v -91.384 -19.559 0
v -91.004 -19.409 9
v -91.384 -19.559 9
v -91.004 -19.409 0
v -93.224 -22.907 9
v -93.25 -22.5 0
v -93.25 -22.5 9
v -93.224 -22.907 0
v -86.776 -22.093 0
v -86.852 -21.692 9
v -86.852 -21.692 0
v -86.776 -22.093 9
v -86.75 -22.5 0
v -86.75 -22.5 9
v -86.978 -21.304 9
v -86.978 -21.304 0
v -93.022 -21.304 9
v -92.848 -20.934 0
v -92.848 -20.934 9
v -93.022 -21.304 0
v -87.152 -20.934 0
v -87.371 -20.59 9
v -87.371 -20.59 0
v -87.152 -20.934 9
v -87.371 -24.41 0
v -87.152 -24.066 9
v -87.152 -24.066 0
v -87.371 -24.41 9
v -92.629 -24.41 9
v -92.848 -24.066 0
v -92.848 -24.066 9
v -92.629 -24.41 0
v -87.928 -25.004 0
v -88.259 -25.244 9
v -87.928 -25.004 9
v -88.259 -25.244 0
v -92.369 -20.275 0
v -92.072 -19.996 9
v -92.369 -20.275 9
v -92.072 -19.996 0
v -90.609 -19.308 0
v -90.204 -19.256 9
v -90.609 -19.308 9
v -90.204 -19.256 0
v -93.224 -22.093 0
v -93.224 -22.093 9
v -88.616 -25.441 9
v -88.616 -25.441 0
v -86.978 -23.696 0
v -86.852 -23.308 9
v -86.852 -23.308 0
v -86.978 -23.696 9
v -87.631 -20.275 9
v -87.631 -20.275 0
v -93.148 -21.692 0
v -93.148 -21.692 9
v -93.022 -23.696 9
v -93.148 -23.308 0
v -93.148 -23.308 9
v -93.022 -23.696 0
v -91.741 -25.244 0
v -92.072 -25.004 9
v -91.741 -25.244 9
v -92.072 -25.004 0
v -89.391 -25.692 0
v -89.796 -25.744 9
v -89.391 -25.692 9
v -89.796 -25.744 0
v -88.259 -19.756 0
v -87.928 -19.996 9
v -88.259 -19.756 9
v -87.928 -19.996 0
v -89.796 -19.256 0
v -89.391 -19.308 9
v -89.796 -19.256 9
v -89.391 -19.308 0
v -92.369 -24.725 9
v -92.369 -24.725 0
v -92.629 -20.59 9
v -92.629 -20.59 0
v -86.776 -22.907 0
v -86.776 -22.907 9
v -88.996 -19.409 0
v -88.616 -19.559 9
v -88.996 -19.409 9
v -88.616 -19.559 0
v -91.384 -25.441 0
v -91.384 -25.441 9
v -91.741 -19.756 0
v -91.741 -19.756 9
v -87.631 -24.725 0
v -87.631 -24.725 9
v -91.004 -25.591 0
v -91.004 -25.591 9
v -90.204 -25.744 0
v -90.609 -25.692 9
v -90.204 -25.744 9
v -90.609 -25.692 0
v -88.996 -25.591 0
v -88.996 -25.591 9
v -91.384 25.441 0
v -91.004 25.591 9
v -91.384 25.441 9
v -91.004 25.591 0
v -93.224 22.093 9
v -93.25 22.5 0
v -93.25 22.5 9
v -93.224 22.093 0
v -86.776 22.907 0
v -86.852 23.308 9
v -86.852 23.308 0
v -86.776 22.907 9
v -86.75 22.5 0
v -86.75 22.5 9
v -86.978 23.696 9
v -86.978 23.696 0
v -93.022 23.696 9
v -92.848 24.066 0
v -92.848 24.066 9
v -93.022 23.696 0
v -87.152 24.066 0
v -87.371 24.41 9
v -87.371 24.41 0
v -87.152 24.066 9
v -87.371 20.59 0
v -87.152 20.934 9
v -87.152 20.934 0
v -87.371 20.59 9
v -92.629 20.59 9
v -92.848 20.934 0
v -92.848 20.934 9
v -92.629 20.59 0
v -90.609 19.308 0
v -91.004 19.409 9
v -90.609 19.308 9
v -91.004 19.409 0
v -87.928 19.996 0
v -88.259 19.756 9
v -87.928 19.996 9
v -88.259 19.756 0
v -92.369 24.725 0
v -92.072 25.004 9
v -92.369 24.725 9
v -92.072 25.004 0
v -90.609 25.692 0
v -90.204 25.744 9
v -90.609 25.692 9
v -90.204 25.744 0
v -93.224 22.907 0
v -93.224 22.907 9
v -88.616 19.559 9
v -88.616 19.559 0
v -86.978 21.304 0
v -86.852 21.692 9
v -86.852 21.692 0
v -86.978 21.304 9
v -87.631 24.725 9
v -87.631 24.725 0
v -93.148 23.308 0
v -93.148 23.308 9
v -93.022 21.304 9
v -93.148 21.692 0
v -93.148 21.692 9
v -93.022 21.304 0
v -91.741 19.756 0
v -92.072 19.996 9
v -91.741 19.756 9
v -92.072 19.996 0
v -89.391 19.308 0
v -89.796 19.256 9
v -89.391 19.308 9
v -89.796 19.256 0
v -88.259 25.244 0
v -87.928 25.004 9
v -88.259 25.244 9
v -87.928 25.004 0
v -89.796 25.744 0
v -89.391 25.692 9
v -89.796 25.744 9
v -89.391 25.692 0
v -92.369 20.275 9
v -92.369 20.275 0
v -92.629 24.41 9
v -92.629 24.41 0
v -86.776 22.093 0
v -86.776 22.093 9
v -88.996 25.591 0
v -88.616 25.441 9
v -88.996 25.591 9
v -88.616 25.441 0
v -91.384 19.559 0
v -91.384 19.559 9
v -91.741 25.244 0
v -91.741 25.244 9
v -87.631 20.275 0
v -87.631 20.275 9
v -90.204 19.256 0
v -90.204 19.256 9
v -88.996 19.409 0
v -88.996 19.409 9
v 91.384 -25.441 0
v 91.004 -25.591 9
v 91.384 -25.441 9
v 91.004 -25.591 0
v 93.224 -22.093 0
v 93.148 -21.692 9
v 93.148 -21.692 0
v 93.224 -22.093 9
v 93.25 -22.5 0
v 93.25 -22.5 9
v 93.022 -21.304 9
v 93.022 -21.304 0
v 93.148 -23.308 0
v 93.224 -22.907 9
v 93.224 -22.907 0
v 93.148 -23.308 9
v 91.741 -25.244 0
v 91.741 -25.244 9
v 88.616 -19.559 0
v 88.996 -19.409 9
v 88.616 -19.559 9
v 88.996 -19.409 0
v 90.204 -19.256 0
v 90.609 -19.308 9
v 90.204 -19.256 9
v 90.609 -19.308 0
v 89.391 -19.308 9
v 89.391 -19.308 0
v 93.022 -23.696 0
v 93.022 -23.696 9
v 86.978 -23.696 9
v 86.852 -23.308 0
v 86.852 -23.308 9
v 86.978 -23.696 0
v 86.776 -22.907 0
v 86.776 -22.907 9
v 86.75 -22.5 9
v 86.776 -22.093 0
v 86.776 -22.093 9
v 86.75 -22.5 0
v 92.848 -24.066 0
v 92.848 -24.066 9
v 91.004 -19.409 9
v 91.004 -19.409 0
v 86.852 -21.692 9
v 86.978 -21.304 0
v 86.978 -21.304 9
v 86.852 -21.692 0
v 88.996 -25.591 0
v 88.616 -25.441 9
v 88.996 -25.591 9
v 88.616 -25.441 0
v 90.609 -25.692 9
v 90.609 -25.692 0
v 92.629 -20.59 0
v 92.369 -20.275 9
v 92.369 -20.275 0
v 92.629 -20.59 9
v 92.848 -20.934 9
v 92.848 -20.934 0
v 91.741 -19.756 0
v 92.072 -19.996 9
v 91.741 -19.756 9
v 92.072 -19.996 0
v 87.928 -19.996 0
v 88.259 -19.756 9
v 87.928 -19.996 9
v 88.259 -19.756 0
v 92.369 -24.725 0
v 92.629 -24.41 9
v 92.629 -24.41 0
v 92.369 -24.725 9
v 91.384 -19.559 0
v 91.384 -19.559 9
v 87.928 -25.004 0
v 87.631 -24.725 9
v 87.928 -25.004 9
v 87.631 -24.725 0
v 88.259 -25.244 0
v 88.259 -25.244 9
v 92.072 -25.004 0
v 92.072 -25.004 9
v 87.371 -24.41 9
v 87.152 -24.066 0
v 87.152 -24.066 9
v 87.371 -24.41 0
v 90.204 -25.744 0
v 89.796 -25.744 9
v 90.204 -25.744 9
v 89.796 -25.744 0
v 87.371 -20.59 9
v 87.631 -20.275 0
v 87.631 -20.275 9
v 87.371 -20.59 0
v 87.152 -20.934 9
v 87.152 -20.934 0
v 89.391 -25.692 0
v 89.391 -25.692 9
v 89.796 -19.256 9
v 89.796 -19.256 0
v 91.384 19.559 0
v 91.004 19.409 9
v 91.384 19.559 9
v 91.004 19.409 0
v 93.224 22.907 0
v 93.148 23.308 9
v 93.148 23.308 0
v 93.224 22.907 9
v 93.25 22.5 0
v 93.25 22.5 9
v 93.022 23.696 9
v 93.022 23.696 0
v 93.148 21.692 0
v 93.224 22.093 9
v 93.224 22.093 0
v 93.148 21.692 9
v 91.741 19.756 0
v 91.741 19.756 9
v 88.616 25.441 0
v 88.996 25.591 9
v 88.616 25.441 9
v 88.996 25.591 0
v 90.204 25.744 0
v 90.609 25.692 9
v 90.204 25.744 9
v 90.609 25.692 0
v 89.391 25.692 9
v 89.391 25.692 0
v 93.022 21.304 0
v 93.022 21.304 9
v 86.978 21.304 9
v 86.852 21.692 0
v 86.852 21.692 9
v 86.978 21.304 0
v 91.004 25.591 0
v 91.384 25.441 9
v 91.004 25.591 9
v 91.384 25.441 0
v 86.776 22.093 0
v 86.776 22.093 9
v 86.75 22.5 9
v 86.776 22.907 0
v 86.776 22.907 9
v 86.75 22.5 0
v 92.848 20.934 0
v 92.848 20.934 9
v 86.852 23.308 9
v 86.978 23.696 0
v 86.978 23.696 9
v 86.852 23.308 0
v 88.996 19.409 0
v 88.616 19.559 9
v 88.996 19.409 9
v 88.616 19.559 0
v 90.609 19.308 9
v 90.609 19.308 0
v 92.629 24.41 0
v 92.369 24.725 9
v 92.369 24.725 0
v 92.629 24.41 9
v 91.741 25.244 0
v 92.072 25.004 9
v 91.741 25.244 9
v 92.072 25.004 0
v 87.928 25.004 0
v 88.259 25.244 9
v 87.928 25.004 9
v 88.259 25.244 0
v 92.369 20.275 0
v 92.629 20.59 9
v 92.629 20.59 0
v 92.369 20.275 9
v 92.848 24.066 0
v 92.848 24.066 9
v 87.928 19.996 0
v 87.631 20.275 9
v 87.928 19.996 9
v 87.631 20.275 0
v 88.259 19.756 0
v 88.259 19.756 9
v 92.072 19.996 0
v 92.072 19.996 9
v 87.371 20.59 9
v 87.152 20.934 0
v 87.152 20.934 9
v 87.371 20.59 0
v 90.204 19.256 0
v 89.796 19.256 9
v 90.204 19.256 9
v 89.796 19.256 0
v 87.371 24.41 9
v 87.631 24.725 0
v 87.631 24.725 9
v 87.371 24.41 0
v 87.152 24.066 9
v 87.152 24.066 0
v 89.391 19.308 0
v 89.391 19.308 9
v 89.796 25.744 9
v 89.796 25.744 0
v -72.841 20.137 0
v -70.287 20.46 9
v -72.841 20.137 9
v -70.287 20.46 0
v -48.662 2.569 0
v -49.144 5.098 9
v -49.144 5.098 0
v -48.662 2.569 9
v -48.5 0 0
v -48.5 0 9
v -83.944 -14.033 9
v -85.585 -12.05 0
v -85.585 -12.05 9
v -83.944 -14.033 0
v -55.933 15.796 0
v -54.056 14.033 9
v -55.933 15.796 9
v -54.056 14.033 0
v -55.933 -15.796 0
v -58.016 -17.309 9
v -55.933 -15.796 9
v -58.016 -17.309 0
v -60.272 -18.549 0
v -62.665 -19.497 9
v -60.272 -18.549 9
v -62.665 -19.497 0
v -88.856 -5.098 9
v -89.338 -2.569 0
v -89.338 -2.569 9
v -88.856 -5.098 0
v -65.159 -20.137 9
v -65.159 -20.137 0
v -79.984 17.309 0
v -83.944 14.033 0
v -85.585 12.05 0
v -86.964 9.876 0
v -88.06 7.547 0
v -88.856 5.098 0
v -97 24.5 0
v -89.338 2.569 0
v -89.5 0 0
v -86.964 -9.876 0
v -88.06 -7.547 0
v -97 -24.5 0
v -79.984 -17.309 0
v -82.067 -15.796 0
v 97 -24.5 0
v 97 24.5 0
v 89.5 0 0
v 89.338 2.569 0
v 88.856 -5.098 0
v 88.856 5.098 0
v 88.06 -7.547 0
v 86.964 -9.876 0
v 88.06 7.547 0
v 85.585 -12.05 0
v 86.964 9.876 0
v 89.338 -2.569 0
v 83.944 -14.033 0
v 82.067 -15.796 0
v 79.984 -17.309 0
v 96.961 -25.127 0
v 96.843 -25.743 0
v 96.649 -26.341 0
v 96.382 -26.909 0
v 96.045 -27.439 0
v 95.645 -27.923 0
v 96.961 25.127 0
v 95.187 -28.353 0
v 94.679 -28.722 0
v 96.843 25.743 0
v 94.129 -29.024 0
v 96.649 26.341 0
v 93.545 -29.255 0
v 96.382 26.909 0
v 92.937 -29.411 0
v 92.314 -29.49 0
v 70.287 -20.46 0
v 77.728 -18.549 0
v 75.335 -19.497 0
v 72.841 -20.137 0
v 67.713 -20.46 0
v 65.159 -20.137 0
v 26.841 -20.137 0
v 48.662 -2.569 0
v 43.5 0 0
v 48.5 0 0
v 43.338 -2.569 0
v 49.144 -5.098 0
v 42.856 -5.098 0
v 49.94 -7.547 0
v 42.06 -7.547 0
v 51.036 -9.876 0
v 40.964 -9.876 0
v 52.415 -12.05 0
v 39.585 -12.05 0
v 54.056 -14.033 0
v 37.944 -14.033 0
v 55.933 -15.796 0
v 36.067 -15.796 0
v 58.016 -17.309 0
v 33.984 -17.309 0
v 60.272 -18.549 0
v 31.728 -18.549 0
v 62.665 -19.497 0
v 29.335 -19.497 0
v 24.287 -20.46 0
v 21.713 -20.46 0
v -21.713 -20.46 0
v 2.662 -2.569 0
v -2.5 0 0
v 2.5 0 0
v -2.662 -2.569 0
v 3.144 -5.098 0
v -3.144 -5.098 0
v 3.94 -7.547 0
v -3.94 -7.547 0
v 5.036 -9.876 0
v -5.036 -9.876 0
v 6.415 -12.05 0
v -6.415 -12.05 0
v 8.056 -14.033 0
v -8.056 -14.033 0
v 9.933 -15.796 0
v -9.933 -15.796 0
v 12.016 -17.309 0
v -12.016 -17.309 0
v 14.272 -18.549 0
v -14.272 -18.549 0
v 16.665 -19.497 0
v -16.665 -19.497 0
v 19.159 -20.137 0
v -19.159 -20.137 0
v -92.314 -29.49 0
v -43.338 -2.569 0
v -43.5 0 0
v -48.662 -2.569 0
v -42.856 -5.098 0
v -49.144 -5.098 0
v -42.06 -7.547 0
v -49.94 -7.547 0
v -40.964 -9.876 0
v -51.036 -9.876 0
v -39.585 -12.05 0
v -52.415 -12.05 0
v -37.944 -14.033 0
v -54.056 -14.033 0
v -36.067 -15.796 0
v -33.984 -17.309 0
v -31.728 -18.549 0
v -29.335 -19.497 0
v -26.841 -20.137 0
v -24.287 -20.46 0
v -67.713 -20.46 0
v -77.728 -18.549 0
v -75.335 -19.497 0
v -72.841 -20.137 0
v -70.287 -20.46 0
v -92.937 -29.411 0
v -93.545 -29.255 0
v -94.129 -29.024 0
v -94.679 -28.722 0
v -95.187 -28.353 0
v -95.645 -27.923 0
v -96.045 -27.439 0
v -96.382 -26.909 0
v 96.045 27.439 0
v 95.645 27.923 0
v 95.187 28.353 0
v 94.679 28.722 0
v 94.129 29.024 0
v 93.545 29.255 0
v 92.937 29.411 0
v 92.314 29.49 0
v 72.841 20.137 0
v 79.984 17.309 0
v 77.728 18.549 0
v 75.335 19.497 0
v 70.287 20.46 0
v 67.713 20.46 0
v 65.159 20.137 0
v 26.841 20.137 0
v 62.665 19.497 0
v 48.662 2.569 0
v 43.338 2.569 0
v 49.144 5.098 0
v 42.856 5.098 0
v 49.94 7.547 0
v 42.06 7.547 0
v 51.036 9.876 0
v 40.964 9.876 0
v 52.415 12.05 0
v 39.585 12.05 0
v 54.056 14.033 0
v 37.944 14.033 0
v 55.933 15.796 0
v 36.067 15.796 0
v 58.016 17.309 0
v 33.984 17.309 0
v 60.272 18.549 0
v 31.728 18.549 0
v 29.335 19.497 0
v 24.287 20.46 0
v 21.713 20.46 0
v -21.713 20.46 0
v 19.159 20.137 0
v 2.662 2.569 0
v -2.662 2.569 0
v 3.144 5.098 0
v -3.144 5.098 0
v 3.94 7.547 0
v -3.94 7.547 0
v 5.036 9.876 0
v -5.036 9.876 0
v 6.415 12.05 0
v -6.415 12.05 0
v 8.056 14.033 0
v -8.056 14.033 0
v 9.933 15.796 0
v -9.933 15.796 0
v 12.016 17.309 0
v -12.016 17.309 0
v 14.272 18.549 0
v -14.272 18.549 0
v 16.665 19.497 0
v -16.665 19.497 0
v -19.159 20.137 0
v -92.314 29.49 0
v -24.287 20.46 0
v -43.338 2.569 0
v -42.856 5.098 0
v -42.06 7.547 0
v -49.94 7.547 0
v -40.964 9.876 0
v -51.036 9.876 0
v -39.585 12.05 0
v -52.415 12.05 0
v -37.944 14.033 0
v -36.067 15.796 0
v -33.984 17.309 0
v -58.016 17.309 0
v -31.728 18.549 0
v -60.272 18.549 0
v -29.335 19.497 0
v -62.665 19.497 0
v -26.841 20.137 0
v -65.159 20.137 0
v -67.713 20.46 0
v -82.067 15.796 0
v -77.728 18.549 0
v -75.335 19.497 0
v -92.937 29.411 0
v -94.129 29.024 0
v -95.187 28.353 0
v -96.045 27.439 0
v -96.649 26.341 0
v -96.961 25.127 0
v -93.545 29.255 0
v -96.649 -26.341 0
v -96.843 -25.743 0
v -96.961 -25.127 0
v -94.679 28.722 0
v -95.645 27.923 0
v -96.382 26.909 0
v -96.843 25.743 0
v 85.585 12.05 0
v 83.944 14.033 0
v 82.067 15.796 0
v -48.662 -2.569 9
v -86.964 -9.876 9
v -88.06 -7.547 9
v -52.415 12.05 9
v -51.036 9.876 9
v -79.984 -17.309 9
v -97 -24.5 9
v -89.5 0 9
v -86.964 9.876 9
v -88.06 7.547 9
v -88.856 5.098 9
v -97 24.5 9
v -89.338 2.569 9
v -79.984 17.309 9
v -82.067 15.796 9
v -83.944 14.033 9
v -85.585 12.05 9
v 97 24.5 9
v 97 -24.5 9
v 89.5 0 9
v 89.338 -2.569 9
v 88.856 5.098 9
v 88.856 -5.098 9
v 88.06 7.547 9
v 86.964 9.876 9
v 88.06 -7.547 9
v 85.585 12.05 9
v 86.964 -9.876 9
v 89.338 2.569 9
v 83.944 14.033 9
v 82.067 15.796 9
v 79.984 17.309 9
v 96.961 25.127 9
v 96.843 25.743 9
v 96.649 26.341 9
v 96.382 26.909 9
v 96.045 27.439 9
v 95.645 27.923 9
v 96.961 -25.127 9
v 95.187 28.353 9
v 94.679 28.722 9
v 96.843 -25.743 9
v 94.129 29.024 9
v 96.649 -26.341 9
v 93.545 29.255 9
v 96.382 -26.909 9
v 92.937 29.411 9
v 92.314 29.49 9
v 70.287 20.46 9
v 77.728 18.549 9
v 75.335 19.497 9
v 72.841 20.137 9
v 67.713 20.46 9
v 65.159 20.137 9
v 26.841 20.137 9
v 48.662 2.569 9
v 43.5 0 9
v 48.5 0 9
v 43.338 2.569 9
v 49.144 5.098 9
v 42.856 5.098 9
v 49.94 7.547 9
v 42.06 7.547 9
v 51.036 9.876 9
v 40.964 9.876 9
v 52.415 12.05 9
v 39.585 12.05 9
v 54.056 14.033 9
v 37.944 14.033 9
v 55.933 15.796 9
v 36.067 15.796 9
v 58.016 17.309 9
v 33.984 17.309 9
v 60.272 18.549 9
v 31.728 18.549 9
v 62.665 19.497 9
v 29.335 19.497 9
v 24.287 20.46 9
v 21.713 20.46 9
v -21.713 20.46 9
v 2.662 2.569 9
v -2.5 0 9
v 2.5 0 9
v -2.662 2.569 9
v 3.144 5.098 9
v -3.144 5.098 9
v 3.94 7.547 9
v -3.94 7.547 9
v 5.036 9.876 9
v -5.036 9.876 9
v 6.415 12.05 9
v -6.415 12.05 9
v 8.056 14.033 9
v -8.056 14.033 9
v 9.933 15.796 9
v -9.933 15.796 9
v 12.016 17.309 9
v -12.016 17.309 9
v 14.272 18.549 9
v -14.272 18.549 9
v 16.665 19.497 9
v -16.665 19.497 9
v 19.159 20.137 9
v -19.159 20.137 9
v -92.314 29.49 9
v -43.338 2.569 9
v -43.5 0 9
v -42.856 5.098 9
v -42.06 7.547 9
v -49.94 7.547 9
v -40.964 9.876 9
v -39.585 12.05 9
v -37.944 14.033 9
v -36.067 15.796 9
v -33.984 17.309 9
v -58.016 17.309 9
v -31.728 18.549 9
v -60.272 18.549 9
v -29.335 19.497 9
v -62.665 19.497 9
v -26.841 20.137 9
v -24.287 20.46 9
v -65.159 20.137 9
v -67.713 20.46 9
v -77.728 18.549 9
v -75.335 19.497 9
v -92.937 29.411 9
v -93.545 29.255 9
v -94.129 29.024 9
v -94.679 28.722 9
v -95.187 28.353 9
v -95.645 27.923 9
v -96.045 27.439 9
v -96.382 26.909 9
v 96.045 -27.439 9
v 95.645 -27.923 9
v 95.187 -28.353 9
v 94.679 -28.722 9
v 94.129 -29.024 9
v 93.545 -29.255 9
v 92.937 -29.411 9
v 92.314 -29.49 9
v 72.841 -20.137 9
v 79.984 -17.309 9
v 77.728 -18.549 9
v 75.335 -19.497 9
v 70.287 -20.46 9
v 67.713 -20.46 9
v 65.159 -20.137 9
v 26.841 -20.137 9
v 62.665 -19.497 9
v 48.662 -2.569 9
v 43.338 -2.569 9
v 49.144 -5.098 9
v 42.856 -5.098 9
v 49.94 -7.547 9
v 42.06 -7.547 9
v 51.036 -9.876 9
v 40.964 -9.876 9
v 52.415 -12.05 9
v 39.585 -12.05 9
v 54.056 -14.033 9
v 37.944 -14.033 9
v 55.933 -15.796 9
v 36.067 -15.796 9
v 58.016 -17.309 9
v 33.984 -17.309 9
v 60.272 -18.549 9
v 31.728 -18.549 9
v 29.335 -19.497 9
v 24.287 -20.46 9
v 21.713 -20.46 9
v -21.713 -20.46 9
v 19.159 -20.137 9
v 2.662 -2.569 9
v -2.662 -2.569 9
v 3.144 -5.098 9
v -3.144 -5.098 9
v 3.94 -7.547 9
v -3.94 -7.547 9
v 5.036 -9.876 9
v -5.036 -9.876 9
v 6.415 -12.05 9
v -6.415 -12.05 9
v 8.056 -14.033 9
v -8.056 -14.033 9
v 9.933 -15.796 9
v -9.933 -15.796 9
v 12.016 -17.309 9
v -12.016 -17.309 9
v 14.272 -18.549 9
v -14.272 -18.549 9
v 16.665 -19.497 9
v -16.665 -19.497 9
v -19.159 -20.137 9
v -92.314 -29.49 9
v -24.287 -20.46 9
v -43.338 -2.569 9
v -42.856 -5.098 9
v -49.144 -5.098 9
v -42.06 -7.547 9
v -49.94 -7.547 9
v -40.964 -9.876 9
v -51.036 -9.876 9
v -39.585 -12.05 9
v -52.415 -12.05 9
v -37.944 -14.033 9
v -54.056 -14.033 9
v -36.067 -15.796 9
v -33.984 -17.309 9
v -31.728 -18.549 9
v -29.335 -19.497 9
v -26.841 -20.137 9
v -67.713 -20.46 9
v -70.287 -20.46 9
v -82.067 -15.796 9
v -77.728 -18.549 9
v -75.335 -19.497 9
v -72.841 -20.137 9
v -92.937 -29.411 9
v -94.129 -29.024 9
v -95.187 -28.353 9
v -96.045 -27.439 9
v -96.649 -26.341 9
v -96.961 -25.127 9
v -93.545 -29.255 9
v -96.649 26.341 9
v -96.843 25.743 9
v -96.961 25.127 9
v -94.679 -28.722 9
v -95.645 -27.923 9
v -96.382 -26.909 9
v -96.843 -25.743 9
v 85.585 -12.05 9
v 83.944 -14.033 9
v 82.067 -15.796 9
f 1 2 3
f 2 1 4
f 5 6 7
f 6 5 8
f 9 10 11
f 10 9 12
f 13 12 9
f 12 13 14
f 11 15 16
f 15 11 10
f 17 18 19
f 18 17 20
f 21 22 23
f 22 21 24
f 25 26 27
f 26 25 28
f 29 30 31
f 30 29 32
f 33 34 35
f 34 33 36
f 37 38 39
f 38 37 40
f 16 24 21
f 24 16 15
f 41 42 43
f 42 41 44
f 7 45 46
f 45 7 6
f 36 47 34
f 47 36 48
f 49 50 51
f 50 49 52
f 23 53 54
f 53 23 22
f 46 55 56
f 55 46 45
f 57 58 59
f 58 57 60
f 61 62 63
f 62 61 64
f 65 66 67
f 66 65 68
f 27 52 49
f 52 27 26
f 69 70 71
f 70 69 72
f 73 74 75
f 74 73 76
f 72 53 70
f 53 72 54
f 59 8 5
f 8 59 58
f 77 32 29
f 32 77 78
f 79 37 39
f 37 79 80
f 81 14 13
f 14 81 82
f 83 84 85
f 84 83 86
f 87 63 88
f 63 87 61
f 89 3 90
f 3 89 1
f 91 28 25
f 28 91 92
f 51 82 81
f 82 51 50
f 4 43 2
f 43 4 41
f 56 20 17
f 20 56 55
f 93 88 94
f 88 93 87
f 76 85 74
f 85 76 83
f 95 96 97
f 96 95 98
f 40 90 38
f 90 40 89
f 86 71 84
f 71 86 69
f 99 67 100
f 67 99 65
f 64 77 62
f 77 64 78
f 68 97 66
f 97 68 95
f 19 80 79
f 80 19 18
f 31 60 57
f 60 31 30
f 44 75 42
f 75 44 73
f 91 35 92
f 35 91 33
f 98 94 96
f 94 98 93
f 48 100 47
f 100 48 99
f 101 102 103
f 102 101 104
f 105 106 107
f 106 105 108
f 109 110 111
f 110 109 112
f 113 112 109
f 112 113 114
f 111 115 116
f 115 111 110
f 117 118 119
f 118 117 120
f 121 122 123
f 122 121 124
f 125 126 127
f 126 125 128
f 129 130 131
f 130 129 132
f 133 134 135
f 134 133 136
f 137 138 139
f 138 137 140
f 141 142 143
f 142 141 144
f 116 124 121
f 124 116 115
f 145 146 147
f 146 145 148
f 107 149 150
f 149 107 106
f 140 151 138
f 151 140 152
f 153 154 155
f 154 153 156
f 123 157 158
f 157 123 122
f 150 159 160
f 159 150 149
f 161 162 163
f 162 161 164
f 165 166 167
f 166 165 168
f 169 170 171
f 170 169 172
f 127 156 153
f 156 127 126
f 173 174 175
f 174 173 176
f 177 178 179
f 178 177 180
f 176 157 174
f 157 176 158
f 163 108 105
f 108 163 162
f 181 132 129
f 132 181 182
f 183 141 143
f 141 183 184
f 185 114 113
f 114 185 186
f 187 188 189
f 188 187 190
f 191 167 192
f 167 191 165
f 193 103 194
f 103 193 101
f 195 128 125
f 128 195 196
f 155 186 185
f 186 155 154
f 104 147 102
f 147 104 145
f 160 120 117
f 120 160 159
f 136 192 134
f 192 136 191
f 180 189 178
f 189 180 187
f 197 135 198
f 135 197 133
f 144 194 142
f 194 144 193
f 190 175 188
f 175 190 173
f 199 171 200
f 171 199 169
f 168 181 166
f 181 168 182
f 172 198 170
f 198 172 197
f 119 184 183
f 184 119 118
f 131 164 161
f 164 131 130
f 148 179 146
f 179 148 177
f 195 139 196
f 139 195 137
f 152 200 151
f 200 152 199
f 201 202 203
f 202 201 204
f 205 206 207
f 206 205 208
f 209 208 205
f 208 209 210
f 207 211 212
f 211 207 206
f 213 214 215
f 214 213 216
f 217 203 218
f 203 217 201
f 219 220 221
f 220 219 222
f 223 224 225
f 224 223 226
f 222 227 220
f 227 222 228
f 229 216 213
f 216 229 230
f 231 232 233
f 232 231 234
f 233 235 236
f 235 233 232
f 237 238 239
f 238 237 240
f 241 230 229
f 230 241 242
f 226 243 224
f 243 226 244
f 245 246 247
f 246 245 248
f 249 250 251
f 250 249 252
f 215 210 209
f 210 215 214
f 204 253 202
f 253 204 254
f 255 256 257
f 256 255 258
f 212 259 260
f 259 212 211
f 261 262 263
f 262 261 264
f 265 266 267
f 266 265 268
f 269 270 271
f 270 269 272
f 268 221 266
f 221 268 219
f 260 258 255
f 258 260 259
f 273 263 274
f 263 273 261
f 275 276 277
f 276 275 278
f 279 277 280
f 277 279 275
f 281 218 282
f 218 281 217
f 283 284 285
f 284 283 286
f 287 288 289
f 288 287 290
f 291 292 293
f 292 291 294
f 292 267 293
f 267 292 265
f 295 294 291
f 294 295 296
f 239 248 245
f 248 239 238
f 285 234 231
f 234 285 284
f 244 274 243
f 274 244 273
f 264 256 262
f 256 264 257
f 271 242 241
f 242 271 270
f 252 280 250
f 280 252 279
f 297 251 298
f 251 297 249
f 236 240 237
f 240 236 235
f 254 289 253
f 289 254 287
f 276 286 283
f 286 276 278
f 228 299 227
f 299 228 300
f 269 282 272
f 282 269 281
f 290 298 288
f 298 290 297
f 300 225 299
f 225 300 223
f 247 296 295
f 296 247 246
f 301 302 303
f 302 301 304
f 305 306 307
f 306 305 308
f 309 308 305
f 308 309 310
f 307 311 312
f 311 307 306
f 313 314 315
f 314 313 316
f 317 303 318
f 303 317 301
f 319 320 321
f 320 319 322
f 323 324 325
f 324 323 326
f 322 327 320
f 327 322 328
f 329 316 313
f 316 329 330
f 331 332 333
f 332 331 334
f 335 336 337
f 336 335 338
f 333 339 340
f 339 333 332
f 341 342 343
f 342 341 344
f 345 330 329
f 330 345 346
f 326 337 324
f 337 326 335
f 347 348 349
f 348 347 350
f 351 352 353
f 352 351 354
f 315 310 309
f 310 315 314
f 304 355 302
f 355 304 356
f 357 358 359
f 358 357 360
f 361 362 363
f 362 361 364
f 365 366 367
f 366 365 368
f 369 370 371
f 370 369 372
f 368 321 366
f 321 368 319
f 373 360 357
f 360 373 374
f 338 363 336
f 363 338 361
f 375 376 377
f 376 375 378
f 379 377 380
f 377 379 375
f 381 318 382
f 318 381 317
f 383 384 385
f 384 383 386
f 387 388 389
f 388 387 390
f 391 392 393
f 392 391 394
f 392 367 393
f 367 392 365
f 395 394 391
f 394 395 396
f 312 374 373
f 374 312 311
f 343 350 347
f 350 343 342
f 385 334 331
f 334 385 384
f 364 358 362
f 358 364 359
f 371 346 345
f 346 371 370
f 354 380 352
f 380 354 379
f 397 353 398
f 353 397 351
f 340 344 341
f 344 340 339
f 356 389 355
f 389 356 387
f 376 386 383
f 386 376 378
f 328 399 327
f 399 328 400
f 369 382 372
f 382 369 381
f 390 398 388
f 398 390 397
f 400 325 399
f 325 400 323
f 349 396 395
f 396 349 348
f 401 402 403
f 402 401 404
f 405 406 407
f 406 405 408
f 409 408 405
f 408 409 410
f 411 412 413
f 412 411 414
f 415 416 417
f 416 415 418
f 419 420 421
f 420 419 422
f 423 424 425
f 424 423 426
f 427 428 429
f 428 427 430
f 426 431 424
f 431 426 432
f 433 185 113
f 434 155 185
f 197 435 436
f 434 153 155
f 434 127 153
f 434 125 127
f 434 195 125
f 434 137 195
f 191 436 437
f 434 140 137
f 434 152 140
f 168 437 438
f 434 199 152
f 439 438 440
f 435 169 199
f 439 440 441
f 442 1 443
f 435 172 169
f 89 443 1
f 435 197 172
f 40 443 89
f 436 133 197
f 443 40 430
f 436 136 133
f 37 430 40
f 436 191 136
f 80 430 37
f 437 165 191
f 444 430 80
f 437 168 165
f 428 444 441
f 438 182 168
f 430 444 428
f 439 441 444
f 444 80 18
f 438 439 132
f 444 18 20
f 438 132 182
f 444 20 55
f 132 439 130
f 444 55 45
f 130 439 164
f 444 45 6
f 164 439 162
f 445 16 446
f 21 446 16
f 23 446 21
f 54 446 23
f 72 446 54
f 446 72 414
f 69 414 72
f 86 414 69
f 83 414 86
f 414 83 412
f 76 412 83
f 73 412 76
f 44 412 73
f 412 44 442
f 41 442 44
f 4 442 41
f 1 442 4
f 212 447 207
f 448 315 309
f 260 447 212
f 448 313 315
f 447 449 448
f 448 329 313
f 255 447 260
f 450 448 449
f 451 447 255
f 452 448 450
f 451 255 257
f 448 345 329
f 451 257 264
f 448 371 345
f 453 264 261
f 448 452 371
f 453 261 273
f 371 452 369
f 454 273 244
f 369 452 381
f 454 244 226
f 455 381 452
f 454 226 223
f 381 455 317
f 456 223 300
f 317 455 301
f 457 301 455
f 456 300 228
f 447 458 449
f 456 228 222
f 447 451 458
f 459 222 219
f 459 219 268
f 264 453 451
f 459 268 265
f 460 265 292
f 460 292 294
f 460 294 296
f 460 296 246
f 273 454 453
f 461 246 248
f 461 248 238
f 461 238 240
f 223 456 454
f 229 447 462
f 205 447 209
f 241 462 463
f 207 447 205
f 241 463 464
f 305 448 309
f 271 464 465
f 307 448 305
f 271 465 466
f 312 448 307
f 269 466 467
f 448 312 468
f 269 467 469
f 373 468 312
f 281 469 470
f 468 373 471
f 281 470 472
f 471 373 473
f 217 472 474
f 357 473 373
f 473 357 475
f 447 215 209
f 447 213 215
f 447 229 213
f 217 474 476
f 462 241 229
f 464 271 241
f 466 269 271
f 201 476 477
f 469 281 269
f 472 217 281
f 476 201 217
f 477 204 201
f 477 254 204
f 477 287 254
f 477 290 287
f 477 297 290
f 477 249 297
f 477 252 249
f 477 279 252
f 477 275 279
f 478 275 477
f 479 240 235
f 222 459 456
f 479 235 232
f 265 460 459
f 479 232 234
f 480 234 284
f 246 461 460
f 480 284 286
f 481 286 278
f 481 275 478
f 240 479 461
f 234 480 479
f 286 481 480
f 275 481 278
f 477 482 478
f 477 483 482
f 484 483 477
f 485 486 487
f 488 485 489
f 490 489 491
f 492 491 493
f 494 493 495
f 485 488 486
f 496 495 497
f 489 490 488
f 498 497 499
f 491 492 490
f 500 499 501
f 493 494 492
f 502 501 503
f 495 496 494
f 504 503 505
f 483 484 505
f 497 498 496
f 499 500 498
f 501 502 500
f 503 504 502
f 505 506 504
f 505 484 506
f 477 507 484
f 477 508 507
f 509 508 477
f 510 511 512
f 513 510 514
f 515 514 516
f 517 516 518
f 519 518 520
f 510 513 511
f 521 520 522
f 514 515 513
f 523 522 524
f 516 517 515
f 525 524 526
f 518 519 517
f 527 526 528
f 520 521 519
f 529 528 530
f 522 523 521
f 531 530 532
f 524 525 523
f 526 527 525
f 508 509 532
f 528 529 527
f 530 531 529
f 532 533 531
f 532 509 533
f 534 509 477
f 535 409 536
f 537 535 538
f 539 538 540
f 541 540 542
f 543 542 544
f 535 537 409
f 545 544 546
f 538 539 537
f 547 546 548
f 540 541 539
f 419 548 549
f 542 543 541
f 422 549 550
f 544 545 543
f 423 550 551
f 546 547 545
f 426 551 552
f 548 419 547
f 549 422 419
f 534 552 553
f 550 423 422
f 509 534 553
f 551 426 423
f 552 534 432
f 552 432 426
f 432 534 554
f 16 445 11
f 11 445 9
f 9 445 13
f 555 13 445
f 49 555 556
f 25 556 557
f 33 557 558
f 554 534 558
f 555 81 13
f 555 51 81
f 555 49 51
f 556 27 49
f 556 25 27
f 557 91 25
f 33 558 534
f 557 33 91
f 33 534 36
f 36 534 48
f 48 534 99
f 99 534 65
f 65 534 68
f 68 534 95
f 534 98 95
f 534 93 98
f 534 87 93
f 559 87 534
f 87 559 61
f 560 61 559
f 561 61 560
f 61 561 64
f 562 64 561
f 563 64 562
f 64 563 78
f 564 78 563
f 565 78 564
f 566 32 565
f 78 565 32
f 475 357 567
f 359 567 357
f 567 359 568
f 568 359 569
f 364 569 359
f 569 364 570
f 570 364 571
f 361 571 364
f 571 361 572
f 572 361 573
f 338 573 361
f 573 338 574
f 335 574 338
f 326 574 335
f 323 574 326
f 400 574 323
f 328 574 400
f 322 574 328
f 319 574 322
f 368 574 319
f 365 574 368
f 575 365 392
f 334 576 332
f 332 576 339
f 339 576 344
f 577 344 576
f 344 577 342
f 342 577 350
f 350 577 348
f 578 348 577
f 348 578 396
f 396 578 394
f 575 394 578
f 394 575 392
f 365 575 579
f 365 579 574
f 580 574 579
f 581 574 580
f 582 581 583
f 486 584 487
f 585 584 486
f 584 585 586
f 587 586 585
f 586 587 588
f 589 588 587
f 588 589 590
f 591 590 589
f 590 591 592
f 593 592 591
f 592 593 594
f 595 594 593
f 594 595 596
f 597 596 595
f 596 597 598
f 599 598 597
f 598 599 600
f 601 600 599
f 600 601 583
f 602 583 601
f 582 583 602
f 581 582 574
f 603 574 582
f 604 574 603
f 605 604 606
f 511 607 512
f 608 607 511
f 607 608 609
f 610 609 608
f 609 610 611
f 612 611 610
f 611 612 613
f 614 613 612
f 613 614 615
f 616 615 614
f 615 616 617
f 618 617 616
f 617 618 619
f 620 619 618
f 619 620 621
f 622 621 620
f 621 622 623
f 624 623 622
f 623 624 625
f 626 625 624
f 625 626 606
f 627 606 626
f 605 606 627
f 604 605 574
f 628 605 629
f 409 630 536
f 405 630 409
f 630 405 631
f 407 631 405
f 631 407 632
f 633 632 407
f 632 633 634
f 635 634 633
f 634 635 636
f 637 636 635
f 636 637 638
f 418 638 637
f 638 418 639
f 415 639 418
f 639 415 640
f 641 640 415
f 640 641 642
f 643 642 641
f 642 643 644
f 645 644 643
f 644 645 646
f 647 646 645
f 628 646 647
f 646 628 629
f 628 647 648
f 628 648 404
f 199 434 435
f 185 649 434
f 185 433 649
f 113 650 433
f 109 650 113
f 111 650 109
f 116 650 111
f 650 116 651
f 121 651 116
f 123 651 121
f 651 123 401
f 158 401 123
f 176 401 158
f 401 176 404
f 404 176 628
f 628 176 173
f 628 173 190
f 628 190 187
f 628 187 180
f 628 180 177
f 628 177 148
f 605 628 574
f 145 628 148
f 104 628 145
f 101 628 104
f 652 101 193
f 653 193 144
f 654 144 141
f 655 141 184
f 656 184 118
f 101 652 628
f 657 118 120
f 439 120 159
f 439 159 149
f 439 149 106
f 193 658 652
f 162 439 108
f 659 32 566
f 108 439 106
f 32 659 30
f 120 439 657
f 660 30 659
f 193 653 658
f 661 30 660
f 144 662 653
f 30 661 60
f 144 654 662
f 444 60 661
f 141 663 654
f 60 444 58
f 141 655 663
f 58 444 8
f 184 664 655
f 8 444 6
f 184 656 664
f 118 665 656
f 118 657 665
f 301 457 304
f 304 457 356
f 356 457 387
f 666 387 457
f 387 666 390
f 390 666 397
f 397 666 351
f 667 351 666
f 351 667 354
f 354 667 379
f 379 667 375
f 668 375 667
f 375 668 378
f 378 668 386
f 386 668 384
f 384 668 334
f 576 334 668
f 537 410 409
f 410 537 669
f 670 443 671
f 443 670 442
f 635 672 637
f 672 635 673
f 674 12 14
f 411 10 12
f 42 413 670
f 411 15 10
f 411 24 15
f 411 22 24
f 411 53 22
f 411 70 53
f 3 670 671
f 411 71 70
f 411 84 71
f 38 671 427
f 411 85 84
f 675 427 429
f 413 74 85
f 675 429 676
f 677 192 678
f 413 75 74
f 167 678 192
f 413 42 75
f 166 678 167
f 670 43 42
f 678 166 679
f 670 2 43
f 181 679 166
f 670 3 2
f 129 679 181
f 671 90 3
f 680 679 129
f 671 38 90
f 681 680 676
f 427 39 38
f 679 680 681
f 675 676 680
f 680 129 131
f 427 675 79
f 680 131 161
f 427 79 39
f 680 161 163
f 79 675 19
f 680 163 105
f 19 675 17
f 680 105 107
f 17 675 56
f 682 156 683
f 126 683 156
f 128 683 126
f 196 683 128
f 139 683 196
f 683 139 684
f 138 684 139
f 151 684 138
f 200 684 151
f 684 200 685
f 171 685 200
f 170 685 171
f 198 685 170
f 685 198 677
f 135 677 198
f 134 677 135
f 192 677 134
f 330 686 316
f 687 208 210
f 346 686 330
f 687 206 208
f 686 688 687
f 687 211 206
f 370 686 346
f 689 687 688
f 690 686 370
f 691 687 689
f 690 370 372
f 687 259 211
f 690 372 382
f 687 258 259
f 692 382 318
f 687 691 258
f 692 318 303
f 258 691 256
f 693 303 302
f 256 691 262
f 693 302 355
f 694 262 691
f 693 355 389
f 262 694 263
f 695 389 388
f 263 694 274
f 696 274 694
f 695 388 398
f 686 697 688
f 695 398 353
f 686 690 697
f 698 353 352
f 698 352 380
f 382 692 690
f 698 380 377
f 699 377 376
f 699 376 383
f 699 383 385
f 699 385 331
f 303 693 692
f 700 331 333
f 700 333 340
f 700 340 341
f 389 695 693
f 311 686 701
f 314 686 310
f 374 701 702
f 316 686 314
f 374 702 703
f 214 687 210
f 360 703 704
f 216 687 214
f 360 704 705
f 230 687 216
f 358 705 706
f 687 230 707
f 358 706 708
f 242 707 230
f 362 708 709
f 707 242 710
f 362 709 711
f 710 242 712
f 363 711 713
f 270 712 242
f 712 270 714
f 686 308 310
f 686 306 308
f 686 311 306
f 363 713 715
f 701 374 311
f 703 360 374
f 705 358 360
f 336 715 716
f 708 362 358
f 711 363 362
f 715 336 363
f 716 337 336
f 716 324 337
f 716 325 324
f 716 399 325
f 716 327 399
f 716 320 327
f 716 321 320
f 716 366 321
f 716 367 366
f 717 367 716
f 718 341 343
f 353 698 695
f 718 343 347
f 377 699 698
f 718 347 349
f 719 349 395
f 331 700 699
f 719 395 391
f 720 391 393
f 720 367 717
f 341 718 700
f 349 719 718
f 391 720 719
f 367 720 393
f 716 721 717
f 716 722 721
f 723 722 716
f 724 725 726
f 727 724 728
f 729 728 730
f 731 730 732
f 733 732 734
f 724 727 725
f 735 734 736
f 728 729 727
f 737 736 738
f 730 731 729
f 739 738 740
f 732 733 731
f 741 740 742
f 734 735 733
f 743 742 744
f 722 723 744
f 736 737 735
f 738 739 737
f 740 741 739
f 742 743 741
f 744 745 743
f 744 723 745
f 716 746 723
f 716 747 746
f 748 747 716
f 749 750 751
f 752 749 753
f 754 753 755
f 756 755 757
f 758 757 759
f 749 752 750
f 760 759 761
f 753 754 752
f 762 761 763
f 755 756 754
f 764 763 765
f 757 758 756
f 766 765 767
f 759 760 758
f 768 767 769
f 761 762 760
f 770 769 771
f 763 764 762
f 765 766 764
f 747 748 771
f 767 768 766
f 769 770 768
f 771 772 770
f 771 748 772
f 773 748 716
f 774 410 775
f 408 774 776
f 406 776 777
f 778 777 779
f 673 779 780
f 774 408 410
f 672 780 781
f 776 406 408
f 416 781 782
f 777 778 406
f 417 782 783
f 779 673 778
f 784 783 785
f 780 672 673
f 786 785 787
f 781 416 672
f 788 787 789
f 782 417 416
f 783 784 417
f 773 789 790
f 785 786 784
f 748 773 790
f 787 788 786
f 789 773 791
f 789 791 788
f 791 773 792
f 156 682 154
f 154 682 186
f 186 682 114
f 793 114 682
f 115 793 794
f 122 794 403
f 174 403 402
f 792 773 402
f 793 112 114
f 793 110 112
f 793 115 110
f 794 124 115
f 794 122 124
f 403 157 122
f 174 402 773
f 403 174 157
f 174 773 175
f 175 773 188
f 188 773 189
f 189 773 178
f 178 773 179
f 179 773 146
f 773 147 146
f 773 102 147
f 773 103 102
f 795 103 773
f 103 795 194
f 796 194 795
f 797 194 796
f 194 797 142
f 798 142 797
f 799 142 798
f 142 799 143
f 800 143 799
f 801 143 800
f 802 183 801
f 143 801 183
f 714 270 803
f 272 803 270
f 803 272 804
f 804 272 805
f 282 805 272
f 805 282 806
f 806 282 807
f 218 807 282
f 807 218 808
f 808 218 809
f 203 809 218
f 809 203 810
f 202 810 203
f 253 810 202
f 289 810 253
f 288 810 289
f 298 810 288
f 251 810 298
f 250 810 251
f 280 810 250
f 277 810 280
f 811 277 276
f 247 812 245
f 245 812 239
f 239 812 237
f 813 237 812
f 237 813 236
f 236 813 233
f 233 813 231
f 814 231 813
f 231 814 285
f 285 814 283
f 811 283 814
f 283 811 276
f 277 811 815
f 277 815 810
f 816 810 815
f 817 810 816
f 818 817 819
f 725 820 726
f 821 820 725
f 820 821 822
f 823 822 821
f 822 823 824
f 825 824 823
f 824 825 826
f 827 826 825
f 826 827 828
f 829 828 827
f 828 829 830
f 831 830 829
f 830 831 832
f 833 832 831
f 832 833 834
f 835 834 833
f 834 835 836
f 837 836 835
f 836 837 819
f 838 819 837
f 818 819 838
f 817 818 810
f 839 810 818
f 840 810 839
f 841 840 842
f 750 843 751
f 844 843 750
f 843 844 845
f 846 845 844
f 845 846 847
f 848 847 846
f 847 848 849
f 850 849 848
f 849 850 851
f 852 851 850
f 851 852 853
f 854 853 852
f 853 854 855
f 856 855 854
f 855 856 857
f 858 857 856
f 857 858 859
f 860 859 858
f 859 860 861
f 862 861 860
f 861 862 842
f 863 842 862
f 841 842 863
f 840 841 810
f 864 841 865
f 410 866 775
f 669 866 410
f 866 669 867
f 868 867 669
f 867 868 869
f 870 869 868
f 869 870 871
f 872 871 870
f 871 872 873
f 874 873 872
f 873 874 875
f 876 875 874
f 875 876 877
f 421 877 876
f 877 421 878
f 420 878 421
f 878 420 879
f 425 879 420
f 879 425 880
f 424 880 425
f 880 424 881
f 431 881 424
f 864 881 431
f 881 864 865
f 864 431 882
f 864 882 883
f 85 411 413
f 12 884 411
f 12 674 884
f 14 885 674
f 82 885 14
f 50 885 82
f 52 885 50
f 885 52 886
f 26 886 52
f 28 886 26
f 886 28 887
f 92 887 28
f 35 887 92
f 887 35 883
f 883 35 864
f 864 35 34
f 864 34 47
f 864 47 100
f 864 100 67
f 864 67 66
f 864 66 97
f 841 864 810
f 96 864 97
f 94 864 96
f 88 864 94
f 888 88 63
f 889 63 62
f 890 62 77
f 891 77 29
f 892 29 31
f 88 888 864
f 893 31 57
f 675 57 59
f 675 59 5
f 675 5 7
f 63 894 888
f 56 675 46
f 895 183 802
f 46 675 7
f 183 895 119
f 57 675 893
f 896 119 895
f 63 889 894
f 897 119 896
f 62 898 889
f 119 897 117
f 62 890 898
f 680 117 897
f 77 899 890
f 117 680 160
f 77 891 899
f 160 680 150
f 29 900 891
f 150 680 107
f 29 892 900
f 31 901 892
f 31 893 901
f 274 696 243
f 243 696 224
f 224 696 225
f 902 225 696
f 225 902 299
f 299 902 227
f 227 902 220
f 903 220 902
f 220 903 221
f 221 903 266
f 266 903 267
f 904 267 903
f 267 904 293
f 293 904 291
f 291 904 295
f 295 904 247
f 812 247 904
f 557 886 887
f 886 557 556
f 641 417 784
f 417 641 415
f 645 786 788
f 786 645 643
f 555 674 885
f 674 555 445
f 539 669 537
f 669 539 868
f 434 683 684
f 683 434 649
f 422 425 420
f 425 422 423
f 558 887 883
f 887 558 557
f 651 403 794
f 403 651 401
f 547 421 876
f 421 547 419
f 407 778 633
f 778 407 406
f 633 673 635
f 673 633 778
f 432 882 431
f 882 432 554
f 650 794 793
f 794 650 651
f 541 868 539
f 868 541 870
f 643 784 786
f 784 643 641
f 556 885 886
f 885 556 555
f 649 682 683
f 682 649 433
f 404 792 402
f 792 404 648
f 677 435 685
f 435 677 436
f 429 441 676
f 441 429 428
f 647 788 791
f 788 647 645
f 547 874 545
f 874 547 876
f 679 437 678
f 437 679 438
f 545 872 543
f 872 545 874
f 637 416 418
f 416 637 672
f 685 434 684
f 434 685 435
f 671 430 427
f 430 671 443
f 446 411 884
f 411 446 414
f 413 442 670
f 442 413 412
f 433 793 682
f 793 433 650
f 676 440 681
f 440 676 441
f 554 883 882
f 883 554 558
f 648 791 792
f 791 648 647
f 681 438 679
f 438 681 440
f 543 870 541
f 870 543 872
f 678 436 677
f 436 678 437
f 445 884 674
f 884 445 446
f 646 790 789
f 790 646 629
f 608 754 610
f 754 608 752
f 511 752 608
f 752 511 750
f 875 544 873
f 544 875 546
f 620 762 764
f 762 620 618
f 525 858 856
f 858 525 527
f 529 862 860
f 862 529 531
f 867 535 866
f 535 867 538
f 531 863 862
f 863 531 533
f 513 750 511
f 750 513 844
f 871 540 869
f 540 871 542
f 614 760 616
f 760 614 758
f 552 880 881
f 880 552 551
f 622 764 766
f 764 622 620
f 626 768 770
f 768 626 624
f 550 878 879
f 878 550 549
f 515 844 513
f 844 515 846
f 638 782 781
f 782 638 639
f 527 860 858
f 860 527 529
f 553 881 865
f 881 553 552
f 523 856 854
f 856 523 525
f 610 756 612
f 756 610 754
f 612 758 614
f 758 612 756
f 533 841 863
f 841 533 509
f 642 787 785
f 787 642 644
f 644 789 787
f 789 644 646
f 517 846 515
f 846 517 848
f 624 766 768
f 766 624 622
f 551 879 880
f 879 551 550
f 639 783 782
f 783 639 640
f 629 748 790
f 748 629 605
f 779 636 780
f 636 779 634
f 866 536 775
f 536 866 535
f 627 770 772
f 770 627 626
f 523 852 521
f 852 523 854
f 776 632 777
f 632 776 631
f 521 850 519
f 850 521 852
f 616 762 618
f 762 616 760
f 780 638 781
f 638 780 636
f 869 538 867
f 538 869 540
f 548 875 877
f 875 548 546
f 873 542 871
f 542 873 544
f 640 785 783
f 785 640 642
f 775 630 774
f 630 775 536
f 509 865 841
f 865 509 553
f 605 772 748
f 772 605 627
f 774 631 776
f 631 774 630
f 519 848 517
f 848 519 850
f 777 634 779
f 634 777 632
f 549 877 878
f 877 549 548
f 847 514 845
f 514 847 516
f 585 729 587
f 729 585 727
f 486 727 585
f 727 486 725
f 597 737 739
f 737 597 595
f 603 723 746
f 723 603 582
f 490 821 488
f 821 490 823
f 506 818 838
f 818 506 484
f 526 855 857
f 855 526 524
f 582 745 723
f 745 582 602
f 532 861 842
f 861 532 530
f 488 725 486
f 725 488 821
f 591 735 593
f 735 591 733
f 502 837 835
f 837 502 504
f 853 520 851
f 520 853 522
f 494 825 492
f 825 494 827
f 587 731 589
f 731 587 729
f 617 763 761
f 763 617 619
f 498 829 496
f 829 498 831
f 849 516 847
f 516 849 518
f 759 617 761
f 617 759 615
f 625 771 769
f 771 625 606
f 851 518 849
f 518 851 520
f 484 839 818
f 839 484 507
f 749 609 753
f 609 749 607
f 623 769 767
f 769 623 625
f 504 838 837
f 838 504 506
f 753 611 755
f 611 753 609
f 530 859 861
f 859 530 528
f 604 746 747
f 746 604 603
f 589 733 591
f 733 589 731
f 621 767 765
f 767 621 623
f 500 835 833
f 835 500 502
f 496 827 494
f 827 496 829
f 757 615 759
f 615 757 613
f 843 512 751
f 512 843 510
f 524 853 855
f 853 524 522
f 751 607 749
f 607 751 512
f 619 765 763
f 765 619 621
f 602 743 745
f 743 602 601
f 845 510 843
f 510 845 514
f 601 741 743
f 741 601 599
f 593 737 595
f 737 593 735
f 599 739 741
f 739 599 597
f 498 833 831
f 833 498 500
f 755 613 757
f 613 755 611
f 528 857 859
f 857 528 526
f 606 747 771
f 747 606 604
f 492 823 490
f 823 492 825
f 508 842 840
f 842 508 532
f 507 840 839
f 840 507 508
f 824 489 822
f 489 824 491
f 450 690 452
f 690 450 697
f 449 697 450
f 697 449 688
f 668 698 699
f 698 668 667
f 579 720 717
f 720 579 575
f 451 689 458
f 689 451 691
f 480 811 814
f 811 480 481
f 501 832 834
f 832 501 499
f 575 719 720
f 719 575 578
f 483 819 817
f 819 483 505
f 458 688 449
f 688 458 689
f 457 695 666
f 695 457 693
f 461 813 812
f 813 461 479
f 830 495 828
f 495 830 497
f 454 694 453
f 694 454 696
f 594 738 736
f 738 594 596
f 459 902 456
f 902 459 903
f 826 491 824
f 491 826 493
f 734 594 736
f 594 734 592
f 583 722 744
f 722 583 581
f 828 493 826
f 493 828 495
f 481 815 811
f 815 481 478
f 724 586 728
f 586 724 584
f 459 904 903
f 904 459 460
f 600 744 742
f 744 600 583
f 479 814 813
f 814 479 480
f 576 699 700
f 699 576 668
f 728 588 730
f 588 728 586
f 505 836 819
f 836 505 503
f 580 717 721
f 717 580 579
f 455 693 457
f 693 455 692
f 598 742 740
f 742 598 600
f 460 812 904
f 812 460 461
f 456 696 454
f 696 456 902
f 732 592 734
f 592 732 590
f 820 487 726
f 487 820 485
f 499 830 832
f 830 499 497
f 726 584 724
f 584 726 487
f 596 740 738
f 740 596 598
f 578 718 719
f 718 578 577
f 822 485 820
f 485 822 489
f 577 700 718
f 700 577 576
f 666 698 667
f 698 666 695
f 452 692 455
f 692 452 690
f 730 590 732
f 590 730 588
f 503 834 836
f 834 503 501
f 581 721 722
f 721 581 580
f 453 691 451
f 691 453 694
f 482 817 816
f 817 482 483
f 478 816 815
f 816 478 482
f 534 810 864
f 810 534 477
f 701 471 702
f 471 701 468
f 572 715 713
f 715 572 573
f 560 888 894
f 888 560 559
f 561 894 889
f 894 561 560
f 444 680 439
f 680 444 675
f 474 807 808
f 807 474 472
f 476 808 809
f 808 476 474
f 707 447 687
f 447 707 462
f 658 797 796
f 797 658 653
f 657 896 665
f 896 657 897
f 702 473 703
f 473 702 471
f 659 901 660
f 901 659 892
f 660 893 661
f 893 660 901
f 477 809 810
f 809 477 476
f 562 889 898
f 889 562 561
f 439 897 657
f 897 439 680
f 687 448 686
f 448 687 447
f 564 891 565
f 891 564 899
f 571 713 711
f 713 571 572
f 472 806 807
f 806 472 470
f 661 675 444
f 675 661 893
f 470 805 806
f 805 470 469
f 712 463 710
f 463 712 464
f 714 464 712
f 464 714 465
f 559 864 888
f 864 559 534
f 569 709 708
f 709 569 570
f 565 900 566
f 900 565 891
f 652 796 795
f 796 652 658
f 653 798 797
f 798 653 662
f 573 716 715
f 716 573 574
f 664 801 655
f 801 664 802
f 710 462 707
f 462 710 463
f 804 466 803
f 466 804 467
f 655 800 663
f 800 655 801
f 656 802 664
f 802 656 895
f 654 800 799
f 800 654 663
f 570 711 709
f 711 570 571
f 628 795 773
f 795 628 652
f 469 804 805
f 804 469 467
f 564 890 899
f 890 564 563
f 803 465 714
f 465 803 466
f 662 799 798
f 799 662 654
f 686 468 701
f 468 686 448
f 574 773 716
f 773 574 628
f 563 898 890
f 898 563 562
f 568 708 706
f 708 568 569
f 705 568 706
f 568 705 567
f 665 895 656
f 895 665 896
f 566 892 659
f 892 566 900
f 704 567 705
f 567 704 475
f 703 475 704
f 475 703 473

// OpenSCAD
$fn = 50;


difference() {
	union() {
		hull() {
			translate(v = [-92.0000000000, 24.5000000000, 0]) {
				cylinder(h = 9, r = 5);
			}
			translate(v = [92.0000000000, 24.5000000000, 0]) {
				cylinder(h = 9, r = 5);
			}
			translate(v = [-92.0000000000, -24.5000000000, 0]) {
				cylinder(h = 9, r = 5);
			}
			translate(v = [92.0000000000, -24.5000000000, 0]) {
				cylinder(h = 9, r = 5);
			}
		}
	}
	union() {
		#translate(v = [-90.0000000000, -22.5000000000, -100.0000000000]) {
			cylinder(h = 200, r = 3.2500000000);
		}
		#translate(v = [-90.0000000000, 22.5000000000, -100.0000000000]) {
			cylinder(h = 200, r = 3.2500000000);
		}
		#translate(v = [90.0000000000, -22.5000000000, -100.0000000000]) {
			cylinder(h = 200, r = 3.2500000000);
		}
		#translate(v = [90.0000000000, 22.5000000000, -100.0000000000]) {
			cylinder(h = 200, r = 3.2500000000);
		}
		#translate(v = [-69.0000000000, 0, 0]) {
			cylinder(h = 9, r = 20.5000000000);
		}
		#translate(v = [-23.0000000000, 0, 0]) {
			cylinder(h = 9, r = 20.5000000000);
		}
		#translate(v = [23.0000000000, 0, 0]) {
			cylinder(h = 9, r = 20.5000000000);
		}
		#translate(v = [69.0000000000, 0, 0]) {
			cylinder(h = 9, r = 20.5000000000);
		}
	}
}
